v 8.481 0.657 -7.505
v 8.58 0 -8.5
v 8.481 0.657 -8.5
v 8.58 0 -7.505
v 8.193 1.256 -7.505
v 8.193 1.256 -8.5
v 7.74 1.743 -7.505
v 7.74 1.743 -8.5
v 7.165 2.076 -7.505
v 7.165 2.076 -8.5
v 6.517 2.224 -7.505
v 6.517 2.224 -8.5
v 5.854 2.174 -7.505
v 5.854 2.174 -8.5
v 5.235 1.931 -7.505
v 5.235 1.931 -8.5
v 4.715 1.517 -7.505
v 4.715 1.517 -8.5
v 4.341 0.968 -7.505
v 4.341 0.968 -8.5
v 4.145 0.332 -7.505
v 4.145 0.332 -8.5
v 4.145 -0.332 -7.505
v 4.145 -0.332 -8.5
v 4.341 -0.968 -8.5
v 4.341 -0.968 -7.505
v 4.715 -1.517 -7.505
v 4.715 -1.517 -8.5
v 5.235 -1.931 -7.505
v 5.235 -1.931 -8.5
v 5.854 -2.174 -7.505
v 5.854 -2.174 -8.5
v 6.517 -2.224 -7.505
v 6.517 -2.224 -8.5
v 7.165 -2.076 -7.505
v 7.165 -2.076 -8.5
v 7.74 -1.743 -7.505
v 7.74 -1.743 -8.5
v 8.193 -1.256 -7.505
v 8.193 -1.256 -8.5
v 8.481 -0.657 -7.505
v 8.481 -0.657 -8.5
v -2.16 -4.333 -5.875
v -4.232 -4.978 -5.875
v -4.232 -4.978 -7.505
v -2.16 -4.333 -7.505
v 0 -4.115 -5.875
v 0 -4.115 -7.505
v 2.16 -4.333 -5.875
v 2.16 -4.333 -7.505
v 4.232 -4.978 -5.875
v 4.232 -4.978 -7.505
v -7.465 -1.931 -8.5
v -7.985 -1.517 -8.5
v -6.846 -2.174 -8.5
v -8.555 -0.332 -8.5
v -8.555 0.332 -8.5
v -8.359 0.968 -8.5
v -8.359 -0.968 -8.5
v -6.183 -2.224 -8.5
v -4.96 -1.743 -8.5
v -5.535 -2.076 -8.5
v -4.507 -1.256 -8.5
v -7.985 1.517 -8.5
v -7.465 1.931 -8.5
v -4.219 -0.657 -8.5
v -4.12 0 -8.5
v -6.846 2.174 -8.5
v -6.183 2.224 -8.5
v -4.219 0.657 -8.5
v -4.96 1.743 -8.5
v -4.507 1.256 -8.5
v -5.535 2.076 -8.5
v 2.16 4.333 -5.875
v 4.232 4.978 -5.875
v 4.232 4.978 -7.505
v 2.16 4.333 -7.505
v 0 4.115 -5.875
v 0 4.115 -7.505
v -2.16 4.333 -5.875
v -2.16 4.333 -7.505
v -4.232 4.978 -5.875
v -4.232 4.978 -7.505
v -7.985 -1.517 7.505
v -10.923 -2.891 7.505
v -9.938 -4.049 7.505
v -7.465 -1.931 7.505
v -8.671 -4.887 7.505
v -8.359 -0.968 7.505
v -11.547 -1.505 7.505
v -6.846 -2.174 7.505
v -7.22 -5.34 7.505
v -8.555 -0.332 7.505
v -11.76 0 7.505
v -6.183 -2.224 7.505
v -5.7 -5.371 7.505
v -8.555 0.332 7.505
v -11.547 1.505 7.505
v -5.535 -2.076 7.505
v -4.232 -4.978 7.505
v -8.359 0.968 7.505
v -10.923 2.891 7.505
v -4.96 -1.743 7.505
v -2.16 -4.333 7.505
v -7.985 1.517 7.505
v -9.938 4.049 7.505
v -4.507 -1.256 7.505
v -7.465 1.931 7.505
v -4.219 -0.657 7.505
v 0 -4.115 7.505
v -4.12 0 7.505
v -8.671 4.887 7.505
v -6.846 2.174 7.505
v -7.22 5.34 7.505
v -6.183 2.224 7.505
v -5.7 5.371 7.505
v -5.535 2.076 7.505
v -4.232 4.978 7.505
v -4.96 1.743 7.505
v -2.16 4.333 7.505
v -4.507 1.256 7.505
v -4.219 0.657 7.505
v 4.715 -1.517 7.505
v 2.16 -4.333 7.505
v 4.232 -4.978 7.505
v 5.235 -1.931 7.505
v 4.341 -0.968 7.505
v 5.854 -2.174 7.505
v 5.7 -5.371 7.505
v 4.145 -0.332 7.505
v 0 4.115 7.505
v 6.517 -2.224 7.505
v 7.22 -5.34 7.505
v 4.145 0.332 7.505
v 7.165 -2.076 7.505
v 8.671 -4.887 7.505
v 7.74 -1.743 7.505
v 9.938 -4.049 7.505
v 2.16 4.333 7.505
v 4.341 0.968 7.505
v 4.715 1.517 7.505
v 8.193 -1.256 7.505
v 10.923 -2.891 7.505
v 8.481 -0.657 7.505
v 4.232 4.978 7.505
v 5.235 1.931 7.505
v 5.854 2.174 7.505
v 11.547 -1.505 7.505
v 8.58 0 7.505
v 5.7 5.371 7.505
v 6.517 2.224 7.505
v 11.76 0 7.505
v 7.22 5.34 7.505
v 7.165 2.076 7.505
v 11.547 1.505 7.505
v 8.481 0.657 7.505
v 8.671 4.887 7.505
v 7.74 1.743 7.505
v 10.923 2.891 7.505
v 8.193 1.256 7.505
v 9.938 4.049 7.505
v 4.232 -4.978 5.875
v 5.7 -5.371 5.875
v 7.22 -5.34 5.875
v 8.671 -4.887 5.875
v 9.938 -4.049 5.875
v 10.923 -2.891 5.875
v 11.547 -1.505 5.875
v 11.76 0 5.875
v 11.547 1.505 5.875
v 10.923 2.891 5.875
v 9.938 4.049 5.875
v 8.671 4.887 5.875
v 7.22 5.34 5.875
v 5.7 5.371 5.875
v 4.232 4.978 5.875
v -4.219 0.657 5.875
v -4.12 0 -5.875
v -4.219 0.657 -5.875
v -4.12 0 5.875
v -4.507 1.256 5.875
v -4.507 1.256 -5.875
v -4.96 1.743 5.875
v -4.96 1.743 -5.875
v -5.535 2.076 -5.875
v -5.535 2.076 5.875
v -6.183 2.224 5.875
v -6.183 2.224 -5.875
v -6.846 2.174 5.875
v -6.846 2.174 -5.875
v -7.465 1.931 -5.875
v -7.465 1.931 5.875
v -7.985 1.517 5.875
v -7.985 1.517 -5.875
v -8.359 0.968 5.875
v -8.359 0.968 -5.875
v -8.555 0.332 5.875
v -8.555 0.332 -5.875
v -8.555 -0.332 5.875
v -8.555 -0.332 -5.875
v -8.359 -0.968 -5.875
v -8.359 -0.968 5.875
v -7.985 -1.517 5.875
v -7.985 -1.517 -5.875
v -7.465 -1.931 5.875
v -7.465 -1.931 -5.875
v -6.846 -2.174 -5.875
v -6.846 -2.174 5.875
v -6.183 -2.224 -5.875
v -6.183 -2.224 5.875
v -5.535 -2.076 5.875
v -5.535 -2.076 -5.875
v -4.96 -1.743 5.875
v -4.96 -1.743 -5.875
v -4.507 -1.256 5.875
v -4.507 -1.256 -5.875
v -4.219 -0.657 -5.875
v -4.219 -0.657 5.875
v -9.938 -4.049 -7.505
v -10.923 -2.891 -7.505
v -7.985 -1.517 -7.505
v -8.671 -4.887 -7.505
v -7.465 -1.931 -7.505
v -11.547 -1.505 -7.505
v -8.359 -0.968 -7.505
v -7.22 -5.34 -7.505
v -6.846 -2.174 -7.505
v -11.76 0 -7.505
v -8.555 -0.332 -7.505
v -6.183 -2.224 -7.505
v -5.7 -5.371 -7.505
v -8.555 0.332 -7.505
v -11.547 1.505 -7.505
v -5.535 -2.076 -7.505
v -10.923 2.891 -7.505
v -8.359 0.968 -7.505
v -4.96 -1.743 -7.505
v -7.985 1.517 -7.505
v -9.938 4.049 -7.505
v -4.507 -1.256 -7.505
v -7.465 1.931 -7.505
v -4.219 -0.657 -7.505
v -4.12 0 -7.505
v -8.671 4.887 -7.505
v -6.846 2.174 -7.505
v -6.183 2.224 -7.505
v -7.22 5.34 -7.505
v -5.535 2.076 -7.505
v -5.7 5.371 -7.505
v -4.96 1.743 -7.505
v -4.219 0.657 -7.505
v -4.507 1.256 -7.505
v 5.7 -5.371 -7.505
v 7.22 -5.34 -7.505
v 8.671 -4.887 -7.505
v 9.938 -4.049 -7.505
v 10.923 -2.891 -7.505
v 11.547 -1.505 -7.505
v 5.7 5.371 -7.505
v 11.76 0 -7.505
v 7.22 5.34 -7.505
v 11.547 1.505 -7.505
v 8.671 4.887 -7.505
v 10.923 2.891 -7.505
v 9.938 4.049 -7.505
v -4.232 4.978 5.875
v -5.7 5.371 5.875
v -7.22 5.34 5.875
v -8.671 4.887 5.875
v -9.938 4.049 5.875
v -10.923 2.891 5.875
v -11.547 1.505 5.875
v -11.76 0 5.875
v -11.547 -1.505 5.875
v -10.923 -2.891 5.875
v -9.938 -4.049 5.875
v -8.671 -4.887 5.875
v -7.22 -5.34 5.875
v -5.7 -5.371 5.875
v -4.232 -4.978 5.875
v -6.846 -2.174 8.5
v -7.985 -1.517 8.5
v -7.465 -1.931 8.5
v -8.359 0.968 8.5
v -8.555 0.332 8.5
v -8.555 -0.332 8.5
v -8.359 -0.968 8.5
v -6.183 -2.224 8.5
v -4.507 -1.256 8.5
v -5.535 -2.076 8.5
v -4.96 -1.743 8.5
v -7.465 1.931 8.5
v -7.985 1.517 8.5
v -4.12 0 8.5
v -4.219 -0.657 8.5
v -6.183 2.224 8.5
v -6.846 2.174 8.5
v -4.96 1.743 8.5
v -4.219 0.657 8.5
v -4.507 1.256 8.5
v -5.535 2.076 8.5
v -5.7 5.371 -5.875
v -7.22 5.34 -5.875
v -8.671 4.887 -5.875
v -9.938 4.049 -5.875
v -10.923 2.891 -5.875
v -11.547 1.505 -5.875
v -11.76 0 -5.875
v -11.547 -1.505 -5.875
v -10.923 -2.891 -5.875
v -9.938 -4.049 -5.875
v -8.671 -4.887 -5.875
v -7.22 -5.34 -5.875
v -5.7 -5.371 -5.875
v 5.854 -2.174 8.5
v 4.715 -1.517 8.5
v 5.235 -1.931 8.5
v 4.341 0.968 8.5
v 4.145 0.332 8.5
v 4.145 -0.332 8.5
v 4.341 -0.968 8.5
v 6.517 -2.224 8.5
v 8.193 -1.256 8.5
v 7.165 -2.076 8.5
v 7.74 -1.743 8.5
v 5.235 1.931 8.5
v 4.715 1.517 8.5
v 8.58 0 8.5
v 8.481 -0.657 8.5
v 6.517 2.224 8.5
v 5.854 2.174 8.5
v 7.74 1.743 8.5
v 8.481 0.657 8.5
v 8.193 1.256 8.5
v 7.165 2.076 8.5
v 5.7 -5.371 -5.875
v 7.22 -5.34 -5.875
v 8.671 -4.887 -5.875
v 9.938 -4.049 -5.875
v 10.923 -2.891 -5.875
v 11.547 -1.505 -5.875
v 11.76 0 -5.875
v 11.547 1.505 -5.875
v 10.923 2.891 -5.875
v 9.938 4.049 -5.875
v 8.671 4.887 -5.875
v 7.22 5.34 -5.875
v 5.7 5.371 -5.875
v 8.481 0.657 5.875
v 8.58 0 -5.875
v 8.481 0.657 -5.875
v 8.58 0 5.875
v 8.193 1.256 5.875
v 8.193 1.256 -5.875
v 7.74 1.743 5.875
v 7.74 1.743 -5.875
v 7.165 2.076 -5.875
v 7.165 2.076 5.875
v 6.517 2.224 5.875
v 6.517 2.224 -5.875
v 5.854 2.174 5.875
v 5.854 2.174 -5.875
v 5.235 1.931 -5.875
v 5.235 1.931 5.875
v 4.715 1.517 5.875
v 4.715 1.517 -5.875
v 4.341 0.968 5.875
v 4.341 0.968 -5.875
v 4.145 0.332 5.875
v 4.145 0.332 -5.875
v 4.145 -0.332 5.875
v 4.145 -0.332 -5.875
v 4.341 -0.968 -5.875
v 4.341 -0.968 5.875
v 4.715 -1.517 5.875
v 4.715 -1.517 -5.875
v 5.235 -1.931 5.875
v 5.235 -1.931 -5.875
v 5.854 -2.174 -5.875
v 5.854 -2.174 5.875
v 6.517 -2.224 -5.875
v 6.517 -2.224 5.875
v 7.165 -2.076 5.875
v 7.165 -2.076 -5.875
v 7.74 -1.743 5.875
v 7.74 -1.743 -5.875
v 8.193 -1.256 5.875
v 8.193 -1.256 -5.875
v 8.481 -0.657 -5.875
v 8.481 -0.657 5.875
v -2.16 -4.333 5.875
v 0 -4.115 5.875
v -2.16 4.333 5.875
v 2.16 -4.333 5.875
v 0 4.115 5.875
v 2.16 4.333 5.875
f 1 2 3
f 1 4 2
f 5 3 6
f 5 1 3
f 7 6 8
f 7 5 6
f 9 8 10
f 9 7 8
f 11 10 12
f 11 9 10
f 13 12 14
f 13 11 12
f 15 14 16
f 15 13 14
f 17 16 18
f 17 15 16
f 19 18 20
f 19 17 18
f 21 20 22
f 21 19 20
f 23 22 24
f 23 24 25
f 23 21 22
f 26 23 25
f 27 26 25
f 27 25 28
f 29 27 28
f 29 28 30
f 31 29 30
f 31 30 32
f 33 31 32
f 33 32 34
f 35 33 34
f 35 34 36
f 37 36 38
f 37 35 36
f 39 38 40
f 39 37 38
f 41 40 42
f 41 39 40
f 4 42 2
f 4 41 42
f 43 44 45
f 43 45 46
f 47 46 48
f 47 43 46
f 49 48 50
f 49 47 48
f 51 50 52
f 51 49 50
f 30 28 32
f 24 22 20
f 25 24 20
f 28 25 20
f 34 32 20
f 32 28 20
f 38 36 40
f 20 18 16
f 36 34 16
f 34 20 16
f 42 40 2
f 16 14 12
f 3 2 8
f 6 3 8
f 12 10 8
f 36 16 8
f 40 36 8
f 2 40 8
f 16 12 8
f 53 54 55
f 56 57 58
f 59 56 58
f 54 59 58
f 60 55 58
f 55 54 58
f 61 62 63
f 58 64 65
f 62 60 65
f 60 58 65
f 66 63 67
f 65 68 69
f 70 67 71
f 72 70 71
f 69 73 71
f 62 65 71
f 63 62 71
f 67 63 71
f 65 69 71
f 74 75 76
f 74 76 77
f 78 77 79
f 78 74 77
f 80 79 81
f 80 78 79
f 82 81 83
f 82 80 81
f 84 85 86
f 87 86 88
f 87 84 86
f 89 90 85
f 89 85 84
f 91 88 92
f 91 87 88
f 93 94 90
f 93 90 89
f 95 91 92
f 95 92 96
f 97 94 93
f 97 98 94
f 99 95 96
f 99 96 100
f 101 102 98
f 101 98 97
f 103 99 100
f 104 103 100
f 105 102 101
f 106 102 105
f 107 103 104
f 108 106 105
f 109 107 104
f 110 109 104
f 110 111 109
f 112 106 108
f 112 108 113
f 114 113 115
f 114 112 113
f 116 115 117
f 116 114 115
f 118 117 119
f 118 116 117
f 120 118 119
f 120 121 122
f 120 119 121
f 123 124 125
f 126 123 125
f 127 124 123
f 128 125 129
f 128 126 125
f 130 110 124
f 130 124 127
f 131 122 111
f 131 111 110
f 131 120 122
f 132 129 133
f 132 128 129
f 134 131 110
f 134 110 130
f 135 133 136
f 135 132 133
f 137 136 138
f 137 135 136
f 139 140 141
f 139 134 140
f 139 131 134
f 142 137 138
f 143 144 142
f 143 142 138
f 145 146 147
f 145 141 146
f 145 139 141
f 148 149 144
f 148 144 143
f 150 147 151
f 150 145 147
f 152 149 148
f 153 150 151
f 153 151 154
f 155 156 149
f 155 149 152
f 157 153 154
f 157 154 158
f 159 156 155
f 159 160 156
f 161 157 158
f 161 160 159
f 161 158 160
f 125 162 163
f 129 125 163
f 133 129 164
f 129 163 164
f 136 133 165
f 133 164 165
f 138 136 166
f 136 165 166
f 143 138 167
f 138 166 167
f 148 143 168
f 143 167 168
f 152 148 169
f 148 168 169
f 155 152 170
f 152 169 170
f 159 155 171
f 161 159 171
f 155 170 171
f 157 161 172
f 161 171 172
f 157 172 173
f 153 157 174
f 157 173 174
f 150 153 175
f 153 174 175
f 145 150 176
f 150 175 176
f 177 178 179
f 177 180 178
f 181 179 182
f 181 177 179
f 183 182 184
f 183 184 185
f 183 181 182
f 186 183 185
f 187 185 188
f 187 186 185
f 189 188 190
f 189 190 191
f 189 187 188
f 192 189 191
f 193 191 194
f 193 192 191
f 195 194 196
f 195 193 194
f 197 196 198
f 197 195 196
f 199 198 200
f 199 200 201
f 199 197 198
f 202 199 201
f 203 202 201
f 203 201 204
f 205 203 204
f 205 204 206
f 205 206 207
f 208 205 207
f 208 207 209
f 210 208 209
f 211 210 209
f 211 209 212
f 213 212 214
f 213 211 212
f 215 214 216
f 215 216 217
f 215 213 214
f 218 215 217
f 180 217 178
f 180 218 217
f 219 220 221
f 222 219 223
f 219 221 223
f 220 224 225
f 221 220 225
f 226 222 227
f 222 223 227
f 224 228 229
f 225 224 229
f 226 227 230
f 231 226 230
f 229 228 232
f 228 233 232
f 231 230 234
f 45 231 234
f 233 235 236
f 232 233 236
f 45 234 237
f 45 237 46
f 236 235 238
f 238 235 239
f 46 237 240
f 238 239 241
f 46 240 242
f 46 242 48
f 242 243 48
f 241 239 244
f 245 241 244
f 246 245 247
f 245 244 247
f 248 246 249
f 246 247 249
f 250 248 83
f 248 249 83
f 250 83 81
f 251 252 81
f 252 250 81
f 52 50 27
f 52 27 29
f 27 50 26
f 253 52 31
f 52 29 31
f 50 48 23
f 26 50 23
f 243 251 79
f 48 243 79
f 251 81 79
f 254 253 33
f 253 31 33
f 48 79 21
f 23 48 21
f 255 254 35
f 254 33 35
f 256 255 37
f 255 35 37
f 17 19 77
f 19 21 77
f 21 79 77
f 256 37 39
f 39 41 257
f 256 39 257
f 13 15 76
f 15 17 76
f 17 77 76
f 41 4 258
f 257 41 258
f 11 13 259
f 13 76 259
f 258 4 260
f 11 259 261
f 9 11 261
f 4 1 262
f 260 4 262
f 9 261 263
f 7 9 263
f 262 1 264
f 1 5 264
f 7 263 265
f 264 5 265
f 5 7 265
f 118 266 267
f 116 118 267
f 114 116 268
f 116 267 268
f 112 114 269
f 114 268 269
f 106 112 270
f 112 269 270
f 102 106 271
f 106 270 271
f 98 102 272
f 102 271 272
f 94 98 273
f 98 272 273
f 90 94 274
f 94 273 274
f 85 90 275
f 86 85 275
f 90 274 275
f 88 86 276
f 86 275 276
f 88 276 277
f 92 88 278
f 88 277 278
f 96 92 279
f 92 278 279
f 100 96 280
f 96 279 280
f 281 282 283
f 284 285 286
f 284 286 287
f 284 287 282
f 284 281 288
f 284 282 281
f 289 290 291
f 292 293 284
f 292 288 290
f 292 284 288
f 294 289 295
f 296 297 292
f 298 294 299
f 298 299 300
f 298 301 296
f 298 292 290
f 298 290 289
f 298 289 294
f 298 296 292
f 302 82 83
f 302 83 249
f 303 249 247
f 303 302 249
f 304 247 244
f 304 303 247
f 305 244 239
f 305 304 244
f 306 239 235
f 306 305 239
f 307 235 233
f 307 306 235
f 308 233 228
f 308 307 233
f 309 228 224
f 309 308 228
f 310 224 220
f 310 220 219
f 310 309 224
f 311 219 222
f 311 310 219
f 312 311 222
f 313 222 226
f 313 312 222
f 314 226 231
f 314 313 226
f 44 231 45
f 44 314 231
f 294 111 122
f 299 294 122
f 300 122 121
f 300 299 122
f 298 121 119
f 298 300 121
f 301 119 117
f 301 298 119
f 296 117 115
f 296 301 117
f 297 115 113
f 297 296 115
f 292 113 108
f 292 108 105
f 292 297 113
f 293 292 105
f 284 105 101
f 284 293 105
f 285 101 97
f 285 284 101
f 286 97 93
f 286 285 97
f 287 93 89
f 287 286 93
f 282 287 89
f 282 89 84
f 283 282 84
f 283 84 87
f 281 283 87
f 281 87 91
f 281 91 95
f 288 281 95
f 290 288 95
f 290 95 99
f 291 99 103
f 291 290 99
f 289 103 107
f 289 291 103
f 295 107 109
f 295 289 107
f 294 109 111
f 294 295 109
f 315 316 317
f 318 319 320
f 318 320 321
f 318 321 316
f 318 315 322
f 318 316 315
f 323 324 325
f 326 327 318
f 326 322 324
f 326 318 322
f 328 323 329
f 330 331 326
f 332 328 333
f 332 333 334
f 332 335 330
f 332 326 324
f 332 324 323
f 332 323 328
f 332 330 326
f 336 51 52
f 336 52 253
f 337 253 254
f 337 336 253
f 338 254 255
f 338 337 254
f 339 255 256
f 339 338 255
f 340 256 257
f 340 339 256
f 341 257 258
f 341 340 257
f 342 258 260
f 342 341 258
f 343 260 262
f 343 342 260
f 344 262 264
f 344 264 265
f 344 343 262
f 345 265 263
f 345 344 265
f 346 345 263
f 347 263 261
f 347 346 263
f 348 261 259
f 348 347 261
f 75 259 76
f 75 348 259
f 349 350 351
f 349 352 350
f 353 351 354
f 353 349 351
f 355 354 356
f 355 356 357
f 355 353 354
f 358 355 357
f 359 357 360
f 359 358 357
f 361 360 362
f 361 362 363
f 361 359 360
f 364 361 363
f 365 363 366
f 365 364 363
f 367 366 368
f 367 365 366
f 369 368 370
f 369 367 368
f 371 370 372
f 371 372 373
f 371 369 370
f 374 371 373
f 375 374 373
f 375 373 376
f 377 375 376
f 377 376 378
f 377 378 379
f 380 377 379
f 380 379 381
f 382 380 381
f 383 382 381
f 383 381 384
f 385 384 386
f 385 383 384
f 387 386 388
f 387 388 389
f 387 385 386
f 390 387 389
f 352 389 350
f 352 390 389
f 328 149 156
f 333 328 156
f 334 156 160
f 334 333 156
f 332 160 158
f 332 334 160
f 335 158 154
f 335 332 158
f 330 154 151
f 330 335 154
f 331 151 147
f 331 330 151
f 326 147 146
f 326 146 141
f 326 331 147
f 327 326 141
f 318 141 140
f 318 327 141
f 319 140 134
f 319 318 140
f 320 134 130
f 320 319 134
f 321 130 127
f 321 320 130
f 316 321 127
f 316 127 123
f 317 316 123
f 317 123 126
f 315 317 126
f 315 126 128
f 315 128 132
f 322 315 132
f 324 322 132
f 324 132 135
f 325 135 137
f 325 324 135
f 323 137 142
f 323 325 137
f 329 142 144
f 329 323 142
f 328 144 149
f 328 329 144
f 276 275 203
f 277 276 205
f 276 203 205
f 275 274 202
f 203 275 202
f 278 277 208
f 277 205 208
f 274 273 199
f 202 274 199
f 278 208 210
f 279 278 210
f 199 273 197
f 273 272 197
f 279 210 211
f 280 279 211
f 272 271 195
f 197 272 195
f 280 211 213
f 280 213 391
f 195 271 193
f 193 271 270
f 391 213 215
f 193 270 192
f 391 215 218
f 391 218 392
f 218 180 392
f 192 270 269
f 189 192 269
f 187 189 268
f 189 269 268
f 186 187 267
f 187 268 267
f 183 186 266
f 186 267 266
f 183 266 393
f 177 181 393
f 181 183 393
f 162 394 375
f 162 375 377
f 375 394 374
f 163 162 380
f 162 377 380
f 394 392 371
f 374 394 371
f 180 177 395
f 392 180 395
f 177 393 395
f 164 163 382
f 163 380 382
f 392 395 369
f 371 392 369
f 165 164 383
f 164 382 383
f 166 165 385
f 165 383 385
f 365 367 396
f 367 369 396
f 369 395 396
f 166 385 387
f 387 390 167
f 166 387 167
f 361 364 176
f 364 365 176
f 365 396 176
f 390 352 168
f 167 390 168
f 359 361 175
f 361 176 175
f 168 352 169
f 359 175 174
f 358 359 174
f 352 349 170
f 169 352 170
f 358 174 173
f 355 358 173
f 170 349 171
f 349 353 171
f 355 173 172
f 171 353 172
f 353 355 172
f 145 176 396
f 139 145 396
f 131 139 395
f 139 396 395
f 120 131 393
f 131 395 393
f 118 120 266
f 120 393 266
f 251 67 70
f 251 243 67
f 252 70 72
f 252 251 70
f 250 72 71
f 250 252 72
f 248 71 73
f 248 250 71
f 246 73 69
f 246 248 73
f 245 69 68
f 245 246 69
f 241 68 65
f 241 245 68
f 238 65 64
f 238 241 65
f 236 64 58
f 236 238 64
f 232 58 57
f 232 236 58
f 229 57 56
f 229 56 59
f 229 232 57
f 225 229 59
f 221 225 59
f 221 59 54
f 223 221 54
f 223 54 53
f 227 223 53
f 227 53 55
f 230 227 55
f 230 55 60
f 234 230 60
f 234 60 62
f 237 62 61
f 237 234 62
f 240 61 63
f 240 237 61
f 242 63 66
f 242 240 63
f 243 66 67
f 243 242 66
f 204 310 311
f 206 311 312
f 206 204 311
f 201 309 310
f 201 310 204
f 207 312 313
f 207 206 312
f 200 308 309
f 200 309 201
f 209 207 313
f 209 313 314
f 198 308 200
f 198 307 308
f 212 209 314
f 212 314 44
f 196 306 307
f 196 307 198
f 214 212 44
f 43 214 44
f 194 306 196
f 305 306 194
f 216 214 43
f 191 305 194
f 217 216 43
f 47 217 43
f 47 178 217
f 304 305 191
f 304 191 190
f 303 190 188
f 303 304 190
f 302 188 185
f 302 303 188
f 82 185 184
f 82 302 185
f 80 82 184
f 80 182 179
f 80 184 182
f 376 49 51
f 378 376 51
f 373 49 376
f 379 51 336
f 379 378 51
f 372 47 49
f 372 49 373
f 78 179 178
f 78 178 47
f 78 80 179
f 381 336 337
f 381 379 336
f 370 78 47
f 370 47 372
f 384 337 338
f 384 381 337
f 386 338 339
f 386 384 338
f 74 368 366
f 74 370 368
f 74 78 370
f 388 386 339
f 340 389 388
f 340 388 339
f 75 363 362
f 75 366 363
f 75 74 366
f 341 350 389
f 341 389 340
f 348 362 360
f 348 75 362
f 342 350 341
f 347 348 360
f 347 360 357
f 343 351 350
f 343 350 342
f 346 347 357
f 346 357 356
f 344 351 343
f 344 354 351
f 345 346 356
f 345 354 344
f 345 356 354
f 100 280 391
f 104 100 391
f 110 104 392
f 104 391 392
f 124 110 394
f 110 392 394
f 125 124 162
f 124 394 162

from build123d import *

# Parameters (mm, degrees)
SKETCH_1_R        = 2.23
EXTRUDE_1_DEPTH   = 8.5
EXTRUDE_1_2_DEPTH = 8.5
EXTRUDE_START     = 5.875
EXTRUDE_2_DEPTH   = 1.63


with BuildPart() as part:
    # Эскиз1 → Бобышка-Вытянуть1 (new, symmetric)
    with BuildSketch(Plane.XY):
        with Locations((-6.35, 0)):
            Circle(SKETCH_1_R)
    extrude(amount=EXTRUDE_1_DEPTH, both=True)



with BuildPart() as body_2:
    # Эскиз1 → Extrude 1 2 (new, symmetric)
    with BuildSketch(Plane.XY):
        with Locations((6.35, 0)):
            Circle(SKETCH_1_R)
    extrude(amount=EXTRUDE_1_2_DEPTH, both=True)


with BuildPart() as part_1:
    add(part.part)

    add(body_2.part)  # Бобышка-Вытянуть2 merges body 2
    # Эскиз2 → Бобышка-Вытянуть2 (add)
    with BuildSketch(Plane.XY.offset(EXTRUDE_START)):
        with BuildLine():
            ThreePointArc((-4.23202836, 4.978182011), (-11.76, 0), (-4.23202836, -4.978182011))
            ThreePointArc((-4.23202836, -4.978182011), (0, -4.115344217), (4.23202836, -4.978182011))
            ThreePointArc((4.23202836, -4.978182011), (11.76, 0), (4.23202836, 4.978182011))
            ThreePointArc((4.23202836, 4.978182011), (0, 4.115344217), (-4.23202836, 4.978182011))
        make_face()
    extrude_2 = extrude(amount=EXTRUDE_2_DEPTH)

    # Зеркальное отражение1: Бобышка-Вытянуть2 across plane
    add(extrude_2.mirror(Plane.XY))


solid = part_1.part
